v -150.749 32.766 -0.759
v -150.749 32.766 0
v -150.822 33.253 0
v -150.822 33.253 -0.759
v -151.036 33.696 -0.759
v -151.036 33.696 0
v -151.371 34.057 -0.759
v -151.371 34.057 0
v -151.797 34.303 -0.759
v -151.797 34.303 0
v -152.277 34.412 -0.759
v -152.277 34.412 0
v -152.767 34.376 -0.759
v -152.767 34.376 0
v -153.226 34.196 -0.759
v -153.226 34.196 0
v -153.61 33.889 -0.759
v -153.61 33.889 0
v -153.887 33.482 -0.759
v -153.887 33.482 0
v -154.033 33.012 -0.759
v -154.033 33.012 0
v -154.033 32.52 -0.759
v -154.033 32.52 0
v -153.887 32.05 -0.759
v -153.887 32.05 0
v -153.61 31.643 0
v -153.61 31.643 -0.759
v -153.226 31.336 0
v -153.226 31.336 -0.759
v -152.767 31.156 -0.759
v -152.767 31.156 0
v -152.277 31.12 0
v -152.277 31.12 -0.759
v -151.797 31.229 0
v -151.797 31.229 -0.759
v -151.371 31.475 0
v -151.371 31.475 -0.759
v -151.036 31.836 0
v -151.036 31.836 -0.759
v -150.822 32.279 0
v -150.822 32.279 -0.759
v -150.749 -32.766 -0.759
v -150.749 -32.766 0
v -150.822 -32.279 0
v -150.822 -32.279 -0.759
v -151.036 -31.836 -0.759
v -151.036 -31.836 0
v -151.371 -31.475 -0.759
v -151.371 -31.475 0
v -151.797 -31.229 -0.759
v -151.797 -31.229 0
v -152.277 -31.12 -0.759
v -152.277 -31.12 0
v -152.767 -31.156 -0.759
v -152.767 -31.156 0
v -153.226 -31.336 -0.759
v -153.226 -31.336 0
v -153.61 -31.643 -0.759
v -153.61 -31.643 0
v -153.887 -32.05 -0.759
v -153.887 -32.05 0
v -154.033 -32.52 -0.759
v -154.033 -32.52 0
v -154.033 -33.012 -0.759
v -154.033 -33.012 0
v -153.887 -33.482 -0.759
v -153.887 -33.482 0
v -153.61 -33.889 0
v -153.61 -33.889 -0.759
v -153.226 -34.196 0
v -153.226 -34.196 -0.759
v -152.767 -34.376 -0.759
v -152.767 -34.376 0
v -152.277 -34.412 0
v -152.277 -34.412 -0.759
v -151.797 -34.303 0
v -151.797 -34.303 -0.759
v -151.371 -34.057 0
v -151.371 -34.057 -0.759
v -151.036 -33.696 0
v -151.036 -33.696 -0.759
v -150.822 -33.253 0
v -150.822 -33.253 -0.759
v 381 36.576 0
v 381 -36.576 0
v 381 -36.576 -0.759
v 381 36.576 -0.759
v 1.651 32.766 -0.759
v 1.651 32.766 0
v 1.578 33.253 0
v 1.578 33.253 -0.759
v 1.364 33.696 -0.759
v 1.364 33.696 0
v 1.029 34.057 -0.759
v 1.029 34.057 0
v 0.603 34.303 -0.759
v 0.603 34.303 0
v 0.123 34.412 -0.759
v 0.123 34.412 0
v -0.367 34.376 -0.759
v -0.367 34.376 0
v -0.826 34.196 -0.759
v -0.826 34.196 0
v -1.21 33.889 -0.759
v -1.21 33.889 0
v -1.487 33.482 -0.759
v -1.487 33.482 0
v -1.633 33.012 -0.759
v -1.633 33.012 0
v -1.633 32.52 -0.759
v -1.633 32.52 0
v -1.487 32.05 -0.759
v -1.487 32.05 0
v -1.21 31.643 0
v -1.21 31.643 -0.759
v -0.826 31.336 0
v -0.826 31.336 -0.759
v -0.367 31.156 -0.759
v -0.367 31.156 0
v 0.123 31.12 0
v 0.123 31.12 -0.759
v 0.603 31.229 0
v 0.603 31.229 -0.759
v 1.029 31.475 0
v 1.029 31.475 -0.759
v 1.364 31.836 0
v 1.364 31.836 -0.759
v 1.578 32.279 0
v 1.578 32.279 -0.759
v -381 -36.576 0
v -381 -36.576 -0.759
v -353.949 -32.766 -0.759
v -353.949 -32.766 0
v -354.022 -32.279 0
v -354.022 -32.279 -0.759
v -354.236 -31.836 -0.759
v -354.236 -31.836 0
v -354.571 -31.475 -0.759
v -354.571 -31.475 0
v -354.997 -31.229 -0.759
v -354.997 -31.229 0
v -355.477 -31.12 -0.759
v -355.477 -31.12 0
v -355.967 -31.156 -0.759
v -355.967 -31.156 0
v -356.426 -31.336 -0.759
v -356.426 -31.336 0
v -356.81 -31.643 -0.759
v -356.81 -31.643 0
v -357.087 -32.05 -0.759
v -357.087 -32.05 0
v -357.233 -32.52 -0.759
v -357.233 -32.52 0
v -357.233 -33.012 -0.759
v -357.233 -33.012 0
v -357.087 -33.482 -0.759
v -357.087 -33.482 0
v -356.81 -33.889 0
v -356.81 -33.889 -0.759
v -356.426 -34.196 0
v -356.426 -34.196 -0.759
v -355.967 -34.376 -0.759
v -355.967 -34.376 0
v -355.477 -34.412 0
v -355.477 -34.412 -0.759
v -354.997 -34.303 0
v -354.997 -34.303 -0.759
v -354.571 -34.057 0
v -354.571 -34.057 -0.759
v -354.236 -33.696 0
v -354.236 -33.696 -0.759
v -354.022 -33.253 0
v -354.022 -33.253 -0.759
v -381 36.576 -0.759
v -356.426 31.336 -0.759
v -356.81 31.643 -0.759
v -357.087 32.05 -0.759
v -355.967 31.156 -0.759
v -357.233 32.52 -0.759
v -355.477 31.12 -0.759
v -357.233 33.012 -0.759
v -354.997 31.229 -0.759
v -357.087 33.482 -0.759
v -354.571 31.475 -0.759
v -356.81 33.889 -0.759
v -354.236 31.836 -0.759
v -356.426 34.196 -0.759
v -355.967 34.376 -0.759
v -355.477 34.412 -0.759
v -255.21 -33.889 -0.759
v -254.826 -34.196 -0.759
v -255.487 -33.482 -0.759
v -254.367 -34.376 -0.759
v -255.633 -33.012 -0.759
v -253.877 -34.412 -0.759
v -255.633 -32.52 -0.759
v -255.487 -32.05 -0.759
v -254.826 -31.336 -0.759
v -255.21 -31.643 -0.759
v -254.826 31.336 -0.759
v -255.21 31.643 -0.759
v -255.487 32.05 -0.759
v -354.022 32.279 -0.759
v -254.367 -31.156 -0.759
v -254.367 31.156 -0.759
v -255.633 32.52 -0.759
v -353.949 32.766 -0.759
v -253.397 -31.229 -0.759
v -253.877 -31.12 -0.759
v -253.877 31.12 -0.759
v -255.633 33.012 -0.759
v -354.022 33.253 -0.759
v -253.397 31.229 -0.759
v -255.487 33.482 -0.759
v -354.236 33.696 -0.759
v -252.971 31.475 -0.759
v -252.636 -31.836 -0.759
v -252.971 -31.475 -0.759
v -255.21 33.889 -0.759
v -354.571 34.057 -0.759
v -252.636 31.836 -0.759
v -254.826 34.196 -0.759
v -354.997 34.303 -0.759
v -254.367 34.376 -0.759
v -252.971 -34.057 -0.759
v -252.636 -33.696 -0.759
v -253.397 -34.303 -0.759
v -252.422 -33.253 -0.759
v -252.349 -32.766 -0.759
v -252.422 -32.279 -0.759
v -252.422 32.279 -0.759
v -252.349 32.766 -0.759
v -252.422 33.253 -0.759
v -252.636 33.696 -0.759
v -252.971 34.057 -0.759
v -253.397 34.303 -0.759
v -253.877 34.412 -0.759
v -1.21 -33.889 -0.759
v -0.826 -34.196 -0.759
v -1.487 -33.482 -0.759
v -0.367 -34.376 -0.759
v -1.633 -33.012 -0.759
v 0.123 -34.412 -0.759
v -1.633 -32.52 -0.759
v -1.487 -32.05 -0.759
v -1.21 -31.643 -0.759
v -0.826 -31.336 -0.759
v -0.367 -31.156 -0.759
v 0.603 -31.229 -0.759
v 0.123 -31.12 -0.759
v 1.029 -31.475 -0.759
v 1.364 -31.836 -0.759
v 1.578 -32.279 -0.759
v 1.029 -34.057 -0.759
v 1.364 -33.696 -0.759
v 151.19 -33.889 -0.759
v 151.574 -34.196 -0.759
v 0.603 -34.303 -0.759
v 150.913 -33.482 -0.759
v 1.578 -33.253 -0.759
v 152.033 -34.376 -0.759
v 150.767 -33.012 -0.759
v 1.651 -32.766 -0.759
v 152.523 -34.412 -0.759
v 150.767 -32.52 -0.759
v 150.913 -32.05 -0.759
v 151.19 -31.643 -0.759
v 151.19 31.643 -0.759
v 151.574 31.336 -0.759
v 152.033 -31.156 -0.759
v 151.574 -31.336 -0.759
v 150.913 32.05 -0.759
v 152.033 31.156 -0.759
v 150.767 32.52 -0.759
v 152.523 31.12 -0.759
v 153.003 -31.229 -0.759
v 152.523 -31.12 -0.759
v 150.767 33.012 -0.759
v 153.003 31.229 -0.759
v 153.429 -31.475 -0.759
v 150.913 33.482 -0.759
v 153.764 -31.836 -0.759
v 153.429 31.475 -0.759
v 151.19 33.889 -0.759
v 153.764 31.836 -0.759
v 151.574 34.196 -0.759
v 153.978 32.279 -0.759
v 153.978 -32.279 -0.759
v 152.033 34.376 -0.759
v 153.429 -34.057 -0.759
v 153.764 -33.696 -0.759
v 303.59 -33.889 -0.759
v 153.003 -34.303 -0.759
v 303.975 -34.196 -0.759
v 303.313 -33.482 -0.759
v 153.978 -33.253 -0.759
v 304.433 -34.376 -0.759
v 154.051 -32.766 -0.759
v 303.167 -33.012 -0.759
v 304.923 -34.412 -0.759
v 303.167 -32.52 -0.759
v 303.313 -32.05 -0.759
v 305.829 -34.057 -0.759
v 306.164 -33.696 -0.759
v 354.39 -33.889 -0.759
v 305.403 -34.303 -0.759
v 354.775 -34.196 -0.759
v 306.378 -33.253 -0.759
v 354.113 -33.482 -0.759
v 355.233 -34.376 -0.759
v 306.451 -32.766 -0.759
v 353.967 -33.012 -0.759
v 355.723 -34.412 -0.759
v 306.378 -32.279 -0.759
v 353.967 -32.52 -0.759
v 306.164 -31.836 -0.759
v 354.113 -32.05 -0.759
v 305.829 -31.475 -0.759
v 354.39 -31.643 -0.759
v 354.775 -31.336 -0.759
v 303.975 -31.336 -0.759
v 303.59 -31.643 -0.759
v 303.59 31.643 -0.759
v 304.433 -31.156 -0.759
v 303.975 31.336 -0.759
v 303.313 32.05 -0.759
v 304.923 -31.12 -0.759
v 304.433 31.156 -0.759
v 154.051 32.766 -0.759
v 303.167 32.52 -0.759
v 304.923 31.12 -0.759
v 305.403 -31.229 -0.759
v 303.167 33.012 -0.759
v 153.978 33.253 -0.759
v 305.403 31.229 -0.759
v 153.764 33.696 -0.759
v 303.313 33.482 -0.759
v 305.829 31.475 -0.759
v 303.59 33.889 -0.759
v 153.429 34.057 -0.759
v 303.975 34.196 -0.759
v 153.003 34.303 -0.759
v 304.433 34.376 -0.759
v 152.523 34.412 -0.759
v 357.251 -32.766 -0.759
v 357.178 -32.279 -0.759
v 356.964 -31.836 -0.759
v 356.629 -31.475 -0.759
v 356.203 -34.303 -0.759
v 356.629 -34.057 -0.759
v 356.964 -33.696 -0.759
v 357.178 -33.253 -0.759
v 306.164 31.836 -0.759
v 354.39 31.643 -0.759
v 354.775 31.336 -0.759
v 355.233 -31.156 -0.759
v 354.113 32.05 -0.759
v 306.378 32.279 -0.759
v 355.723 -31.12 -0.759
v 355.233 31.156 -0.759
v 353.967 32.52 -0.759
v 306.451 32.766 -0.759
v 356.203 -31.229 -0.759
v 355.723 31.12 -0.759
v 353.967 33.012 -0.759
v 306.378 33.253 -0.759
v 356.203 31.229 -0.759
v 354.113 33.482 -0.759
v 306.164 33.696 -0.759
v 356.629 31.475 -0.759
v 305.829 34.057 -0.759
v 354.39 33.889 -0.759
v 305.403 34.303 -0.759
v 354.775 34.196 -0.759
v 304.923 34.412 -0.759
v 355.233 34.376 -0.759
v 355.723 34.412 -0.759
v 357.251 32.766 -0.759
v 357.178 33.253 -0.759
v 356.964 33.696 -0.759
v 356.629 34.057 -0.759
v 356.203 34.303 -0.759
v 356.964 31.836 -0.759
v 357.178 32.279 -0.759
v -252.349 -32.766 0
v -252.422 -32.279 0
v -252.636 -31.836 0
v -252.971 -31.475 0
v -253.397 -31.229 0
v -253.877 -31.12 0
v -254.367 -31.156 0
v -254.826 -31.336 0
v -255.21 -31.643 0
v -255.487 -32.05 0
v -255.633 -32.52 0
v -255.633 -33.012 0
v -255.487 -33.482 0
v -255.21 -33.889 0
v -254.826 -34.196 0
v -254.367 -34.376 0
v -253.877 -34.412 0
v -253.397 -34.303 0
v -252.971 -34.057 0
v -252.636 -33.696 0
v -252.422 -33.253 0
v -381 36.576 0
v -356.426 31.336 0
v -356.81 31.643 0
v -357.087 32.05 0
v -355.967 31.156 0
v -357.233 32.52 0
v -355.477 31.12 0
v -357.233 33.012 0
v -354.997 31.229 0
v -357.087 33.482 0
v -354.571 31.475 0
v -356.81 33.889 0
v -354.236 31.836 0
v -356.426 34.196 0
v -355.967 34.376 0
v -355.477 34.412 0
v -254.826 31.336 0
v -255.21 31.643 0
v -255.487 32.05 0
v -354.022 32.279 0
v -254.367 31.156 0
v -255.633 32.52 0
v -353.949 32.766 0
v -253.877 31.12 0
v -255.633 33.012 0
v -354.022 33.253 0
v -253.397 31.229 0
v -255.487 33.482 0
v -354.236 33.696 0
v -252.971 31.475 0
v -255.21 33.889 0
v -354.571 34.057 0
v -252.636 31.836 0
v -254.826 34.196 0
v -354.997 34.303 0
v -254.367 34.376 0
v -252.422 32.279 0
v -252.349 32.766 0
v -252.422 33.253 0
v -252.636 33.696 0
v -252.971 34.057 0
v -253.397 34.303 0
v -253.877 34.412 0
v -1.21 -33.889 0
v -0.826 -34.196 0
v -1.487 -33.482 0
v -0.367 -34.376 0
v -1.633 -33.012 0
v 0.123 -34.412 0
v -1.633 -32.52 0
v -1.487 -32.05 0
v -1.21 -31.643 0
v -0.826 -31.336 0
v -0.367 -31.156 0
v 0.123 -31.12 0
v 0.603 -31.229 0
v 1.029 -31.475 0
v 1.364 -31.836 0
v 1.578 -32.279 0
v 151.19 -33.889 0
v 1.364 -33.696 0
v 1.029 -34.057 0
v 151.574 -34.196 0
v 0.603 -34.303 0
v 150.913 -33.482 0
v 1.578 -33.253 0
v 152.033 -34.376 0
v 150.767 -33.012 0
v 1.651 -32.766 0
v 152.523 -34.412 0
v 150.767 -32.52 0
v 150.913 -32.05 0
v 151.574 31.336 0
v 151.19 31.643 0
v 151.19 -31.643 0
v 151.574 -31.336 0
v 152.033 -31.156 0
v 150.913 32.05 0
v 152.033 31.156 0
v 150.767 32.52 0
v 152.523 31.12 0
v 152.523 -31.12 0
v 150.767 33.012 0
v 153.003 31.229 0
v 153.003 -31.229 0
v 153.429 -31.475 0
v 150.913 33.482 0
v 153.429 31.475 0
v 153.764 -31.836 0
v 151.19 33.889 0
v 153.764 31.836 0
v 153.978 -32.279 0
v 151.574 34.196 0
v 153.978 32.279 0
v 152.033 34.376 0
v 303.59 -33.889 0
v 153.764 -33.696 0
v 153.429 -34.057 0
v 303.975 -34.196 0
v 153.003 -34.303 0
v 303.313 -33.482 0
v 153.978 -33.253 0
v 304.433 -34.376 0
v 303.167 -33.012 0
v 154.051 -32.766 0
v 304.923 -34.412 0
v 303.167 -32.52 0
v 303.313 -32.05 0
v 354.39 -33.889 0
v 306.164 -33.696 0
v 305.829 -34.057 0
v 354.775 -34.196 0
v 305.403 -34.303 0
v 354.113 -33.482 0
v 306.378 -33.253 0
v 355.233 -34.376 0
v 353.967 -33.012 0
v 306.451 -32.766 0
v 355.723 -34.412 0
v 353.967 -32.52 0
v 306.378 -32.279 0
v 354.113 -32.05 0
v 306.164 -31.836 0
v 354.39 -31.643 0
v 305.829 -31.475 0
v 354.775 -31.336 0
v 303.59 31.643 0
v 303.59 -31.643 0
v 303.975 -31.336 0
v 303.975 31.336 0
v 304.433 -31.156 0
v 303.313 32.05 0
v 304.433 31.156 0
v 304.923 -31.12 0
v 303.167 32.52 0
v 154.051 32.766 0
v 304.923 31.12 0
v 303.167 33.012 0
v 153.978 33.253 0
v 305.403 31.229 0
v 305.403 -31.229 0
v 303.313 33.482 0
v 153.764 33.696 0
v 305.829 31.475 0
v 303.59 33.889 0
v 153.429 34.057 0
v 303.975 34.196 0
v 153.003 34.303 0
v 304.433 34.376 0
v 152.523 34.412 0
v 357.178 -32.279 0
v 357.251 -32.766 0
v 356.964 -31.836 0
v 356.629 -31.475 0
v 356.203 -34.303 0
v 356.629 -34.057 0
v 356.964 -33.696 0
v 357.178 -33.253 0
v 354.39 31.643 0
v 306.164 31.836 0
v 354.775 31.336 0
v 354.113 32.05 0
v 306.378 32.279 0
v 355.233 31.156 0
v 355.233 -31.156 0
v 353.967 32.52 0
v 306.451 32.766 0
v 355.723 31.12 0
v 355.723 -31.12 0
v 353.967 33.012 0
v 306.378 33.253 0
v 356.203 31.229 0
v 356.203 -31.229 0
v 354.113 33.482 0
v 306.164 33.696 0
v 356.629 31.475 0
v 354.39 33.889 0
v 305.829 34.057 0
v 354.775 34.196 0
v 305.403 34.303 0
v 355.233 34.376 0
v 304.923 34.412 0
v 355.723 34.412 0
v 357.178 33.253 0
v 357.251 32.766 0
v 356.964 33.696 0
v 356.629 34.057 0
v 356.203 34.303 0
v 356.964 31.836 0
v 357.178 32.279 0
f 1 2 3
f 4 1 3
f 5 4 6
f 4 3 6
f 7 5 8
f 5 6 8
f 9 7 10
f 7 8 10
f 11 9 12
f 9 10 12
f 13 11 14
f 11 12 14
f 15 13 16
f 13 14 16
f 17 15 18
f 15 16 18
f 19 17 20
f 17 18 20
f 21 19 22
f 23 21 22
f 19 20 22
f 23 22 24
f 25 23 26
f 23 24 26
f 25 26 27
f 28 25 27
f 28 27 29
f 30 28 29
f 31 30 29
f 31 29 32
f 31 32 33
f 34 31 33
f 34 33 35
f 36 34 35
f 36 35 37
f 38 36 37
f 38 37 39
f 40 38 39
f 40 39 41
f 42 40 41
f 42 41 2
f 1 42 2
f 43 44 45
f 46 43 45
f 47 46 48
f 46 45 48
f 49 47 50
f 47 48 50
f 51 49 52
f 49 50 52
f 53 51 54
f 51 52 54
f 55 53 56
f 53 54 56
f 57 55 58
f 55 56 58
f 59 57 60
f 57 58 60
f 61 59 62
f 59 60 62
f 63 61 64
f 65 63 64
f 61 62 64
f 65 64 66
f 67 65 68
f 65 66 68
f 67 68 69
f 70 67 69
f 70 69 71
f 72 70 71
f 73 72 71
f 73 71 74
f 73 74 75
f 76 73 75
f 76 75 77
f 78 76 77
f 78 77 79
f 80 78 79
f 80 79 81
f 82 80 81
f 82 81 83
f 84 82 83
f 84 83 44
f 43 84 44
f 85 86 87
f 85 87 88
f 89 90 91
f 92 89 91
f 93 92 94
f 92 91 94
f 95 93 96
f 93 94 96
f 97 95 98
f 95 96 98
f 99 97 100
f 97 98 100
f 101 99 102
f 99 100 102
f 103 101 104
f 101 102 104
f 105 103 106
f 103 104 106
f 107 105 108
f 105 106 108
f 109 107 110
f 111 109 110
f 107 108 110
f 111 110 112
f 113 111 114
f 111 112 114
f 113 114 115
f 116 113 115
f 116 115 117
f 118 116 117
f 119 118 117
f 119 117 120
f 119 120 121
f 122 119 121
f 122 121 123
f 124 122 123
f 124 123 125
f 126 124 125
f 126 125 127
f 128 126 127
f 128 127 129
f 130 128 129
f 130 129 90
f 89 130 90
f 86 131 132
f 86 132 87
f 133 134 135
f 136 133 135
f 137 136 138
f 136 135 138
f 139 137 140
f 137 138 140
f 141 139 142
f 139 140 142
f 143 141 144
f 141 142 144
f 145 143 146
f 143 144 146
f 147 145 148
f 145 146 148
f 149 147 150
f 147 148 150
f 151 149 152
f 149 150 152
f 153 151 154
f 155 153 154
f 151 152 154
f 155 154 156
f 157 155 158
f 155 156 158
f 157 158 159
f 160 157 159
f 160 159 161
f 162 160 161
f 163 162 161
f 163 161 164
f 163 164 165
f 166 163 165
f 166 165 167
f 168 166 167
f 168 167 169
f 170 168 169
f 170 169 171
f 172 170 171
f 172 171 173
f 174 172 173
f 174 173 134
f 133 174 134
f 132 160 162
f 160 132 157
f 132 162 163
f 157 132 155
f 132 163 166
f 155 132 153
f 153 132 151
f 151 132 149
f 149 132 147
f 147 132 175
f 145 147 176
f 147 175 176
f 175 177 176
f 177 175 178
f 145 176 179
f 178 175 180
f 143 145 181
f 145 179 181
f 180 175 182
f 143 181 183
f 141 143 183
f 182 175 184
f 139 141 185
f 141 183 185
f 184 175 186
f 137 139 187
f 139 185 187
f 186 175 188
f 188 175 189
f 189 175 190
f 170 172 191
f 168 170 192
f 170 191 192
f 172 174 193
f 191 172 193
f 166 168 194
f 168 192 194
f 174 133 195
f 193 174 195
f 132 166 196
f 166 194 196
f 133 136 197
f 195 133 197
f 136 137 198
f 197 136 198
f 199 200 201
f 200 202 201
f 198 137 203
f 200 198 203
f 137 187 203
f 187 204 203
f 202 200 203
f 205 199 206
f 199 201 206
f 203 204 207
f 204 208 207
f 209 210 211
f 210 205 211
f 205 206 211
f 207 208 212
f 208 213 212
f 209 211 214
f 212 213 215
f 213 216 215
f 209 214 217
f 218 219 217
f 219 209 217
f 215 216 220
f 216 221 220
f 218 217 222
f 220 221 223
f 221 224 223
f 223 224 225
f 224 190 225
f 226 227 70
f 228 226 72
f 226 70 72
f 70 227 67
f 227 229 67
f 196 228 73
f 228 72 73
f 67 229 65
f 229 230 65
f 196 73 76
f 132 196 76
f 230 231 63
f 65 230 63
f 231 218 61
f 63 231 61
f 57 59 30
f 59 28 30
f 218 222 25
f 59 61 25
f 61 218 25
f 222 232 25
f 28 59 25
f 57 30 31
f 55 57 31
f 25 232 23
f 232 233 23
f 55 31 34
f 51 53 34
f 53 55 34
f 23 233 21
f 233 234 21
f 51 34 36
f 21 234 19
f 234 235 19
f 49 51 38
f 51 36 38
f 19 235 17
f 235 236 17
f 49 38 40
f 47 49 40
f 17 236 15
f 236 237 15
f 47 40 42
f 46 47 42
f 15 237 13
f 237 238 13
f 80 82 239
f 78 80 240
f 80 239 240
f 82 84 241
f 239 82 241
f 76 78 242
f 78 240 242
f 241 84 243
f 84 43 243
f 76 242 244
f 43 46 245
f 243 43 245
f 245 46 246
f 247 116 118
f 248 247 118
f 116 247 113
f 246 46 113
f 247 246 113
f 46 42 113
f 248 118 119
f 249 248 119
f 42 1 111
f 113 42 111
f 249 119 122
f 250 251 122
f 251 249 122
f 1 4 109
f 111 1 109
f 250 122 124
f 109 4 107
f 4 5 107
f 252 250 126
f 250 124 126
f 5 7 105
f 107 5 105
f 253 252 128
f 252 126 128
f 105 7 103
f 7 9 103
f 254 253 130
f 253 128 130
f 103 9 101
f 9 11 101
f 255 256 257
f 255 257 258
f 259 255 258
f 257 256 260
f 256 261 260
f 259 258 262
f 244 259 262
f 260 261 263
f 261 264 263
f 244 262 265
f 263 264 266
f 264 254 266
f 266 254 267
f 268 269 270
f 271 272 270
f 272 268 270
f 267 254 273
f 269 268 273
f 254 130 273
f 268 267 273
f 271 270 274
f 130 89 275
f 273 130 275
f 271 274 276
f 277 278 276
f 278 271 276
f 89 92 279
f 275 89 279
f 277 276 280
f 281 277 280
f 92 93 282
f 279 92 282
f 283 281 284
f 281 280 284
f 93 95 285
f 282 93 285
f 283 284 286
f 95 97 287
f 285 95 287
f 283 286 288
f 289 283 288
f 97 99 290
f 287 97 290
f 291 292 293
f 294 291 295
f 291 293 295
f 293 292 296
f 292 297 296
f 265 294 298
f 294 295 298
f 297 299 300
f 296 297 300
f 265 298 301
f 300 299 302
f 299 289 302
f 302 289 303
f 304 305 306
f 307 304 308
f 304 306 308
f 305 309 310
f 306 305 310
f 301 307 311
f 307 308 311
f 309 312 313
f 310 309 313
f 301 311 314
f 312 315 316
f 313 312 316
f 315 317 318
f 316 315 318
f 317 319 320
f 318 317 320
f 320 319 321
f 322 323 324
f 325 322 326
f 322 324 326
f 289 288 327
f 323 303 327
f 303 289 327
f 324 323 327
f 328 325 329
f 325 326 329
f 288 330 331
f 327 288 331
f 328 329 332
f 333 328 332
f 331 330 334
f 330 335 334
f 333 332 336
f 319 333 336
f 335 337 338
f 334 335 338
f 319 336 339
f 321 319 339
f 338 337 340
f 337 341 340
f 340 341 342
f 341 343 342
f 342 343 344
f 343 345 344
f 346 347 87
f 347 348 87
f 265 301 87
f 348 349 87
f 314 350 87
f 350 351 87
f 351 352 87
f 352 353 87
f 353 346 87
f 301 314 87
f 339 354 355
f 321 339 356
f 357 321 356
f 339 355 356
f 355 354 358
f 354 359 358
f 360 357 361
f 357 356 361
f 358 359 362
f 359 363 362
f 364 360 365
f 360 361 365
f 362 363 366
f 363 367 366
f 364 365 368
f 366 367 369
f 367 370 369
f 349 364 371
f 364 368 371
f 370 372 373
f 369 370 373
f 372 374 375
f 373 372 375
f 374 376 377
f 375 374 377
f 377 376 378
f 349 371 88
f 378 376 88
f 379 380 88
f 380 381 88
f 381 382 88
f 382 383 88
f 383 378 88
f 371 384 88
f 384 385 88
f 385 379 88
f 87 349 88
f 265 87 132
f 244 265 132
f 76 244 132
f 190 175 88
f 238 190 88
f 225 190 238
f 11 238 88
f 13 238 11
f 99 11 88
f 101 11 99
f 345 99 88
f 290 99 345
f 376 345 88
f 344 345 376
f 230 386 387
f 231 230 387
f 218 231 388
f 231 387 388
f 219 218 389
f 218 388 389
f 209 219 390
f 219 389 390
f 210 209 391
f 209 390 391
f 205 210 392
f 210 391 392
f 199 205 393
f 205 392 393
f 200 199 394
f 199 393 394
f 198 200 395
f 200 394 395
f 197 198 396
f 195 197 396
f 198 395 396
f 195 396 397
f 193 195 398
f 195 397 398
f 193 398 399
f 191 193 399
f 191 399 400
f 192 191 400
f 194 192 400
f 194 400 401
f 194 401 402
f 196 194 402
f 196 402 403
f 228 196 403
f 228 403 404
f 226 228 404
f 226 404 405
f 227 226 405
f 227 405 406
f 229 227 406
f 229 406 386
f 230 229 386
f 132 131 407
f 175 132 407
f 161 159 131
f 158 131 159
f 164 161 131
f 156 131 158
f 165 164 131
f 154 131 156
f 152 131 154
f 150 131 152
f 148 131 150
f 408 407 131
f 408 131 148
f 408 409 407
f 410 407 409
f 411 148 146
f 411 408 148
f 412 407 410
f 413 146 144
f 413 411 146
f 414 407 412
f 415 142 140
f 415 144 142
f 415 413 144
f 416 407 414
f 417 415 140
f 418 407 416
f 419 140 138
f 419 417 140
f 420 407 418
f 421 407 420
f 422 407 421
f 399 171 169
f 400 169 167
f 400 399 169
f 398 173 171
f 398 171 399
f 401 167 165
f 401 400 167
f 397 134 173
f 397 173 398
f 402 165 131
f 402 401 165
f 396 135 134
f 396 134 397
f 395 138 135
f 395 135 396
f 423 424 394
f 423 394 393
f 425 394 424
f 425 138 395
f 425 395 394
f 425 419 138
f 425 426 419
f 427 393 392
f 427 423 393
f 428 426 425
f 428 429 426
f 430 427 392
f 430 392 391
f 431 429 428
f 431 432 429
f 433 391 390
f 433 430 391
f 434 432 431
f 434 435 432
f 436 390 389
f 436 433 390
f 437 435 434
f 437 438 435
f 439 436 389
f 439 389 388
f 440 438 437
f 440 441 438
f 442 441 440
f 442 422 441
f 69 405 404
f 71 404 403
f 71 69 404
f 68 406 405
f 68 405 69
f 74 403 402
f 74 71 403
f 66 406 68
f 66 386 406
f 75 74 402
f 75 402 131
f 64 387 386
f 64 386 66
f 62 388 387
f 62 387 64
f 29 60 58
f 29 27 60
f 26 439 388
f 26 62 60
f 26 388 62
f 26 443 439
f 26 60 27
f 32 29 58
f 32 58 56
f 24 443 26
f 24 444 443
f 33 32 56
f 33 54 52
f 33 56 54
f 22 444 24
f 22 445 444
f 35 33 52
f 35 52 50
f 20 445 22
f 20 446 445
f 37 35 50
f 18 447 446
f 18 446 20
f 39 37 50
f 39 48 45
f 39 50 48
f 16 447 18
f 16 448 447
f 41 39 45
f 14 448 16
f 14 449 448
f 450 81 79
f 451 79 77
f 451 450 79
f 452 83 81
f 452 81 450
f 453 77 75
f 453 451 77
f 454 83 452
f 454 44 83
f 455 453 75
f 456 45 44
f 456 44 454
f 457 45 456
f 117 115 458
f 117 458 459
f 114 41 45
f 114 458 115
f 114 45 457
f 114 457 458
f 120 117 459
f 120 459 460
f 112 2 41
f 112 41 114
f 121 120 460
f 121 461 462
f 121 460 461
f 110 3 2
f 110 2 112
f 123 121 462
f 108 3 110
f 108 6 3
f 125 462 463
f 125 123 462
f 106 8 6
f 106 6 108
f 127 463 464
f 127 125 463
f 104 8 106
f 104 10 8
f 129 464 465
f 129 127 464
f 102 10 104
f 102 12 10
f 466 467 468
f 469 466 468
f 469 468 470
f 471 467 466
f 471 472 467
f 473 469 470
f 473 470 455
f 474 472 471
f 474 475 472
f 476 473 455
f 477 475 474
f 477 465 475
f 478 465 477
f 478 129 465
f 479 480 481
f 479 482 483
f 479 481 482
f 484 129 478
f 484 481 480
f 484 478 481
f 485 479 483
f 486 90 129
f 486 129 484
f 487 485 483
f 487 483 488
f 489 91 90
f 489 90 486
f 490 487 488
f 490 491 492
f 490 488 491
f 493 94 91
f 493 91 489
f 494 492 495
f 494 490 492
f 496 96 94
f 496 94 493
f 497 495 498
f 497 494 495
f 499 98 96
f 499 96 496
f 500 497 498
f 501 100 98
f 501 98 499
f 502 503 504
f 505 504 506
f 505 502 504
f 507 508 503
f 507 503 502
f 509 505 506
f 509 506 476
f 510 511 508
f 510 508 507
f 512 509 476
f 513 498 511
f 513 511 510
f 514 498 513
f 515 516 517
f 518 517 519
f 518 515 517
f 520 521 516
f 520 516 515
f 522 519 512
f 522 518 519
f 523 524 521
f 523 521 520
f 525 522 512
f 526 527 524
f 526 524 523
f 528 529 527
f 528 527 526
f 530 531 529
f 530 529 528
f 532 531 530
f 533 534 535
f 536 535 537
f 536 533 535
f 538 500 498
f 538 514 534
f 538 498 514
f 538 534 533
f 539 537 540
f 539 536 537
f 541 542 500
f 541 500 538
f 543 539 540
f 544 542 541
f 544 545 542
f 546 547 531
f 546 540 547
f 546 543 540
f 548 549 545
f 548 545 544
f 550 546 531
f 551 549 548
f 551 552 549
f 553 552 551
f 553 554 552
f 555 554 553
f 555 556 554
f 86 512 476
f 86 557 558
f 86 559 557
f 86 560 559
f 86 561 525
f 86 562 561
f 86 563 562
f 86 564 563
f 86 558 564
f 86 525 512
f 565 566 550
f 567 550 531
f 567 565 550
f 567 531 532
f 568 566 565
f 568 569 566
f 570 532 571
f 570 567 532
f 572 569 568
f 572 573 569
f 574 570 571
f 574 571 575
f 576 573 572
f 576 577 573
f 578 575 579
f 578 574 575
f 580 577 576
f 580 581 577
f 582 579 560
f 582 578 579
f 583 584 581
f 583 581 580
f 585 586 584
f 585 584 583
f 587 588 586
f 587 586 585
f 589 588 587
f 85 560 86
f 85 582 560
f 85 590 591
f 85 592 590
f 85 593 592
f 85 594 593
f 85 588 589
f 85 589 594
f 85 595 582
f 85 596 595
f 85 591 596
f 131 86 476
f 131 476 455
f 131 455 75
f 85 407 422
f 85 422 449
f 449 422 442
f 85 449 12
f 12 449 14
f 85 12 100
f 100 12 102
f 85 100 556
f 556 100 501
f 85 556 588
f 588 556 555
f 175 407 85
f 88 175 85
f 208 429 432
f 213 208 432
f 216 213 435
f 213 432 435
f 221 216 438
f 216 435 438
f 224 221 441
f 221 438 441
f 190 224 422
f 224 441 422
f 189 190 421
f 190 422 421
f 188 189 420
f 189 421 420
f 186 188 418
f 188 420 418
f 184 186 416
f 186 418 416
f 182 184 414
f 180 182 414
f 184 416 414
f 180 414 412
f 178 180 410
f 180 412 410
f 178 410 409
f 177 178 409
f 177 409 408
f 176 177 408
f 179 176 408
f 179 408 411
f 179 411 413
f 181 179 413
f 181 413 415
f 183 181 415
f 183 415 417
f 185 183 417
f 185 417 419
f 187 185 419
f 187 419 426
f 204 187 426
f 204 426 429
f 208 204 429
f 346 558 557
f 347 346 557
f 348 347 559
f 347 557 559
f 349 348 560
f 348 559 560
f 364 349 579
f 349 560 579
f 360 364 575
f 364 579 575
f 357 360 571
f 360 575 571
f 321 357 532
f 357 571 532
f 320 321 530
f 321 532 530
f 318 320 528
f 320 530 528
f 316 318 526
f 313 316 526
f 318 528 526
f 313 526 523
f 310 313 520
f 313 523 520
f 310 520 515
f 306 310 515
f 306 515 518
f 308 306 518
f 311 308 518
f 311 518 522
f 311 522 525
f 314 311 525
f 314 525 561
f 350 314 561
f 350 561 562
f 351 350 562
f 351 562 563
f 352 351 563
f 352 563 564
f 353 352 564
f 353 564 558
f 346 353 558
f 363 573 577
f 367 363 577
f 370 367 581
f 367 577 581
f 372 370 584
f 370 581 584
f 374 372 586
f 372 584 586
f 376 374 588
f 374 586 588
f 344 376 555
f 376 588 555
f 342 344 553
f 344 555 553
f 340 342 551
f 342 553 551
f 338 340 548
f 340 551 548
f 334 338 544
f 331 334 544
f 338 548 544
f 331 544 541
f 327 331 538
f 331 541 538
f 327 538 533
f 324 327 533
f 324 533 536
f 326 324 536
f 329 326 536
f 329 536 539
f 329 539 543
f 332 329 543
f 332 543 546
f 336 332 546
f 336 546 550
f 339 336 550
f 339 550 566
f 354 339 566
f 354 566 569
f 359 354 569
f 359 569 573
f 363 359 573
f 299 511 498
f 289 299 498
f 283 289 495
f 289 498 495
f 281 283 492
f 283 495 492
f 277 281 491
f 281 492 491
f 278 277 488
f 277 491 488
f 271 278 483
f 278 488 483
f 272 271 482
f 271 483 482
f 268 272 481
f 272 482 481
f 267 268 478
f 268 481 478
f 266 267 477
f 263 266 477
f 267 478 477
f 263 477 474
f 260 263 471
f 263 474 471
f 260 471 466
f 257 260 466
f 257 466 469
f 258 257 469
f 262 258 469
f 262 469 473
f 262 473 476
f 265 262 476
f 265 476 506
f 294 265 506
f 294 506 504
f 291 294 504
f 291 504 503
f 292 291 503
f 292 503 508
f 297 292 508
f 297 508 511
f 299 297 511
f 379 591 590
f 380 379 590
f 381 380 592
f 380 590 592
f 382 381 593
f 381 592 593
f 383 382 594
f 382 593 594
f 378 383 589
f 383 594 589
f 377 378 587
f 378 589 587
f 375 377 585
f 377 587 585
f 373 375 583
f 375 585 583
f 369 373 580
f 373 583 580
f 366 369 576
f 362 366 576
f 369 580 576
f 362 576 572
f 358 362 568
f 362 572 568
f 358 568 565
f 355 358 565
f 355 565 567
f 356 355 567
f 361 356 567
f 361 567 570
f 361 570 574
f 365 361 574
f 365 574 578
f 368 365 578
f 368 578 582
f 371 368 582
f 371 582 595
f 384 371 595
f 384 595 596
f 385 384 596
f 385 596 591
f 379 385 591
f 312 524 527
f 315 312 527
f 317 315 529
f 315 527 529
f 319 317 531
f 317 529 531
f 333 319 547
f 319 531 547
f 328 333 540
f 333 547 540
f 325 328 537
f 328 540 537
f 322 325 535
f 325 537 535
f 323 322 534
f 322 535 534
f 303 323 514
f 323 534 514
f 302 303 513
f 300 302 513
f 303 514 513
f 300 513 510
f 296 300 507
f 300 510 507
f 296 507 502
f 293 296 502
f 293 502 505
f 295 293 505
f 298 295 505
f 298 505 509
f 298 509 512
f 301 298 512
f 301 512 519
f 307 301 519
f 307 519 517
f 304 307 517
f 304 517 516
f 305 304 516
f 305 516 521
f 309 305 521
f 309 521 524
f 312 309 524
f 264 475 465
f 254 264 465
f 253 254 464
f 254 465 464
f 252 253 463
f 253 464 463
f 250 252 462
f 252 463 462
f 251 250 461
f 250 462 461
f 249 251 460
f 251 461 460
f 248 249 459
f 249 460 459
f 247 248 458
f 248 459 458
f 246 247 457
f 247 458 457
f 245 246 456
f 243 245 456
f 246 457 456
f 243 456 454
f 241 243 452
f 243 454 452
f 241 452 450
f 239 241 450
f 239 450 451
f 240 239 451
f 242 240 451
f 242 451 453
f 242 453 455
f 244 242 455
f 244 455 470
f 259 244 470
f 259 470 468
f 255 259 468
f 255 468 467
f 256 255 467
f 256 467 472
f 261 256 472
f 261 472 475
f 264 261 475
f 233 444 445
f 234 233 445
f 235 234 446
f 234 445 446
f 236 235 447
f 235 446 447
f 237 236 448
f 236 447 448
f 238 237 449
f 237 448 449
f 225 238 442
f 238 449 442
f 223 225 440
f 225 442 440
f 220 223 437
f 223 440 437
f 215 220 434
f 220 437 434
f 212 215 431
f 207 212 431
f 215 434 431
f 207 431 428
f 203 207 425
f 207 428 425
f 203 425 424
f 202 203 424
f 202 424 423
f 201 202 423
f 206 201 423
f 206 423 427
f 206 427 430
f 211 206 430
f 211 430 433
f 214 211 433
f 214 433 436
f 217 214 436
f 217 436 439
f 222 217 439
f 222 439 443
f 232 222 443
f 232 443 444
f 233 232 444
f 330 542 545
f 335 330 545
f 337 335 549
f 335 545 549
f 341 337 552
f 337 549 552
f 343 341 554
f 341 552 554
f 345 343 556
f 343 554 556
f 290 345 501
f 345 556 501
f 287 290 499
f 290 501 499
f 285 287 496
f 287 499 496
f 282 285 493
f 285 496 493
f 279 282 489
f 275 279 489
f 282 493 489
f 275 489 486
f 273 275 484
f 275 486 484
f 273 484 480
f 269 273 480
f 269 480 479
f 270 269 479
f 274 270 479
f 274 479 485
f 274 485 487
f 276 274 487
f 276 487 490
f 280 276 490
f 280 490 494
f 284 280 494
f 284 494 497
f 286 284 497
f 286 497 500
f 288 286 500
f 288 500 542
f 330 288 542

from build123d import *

# Parameters (mm, degrees)
SKETCH2_W          = 762
SKETCH2_H          = 73.152
BASE_FLANGE1_DEPTH = 0.75946
SKETCH13_R         = 1.651
CUT_EXTRUDE1_DEPTH = 383.752374983


# Sheet-metal steps are written as plain solids
with BuildPart() as part:
    # Sketch2 → Base-Flange1 (new body)
    with BuildSketch(Plane.XY):
        Rectangle(SKETCH2_W, SKETCH2_H)
    extrude(amount=-BASE_FLANGE1_DEPTH)

    # Sketch13 → Cut-Extrude1 (cut, through all)
    with BuildSketch(Plane.XY):
        with Locations((-254, 32.766)):
            Circle(SKETCH13_R)
        with Locations((-254, -32.766)):
            Circle(SKETCH13_R)
        with Locations((0, 32.766)):
            Circle(SKETCH13_R)
        with Locations((304.8, 32.766)):
            Circle(SKETCH13_R)
        with Locations((304.8, -32.766)):
            Circle(SKETCH13_R)
        with Locations((0, -32.766)):
            Circle(SKETCH13_R)
        with Locations((355.6, 32.766)):
            Circle(SKETCH13_R)
        with Locations((355.6, -32.766)):
            Circle(SKETCH13_R)
        with Locations((152.4, 32.766)):
            Circle(SKETCH13_R)
        with Locations((152.4, -32.766)):
            Circle(SKETCH13_R)
        with Locations((-152.4, 32.766)):
            Circle(SKETCH13_R)
        with Locations((-152.4, -32.766)):
            Circle(SKETCH13_R)
        with Locations((-355.6, 32.766)):
            Circle(SKETCH13_R)
        with Locations((-355.6, -32.766)):
            Circle(SKETCH13_R)
    extrude(amount=-CUT_EXTRUDE1_DEPTH, mode=Mode.SUBTRACT)


solid = part.part
